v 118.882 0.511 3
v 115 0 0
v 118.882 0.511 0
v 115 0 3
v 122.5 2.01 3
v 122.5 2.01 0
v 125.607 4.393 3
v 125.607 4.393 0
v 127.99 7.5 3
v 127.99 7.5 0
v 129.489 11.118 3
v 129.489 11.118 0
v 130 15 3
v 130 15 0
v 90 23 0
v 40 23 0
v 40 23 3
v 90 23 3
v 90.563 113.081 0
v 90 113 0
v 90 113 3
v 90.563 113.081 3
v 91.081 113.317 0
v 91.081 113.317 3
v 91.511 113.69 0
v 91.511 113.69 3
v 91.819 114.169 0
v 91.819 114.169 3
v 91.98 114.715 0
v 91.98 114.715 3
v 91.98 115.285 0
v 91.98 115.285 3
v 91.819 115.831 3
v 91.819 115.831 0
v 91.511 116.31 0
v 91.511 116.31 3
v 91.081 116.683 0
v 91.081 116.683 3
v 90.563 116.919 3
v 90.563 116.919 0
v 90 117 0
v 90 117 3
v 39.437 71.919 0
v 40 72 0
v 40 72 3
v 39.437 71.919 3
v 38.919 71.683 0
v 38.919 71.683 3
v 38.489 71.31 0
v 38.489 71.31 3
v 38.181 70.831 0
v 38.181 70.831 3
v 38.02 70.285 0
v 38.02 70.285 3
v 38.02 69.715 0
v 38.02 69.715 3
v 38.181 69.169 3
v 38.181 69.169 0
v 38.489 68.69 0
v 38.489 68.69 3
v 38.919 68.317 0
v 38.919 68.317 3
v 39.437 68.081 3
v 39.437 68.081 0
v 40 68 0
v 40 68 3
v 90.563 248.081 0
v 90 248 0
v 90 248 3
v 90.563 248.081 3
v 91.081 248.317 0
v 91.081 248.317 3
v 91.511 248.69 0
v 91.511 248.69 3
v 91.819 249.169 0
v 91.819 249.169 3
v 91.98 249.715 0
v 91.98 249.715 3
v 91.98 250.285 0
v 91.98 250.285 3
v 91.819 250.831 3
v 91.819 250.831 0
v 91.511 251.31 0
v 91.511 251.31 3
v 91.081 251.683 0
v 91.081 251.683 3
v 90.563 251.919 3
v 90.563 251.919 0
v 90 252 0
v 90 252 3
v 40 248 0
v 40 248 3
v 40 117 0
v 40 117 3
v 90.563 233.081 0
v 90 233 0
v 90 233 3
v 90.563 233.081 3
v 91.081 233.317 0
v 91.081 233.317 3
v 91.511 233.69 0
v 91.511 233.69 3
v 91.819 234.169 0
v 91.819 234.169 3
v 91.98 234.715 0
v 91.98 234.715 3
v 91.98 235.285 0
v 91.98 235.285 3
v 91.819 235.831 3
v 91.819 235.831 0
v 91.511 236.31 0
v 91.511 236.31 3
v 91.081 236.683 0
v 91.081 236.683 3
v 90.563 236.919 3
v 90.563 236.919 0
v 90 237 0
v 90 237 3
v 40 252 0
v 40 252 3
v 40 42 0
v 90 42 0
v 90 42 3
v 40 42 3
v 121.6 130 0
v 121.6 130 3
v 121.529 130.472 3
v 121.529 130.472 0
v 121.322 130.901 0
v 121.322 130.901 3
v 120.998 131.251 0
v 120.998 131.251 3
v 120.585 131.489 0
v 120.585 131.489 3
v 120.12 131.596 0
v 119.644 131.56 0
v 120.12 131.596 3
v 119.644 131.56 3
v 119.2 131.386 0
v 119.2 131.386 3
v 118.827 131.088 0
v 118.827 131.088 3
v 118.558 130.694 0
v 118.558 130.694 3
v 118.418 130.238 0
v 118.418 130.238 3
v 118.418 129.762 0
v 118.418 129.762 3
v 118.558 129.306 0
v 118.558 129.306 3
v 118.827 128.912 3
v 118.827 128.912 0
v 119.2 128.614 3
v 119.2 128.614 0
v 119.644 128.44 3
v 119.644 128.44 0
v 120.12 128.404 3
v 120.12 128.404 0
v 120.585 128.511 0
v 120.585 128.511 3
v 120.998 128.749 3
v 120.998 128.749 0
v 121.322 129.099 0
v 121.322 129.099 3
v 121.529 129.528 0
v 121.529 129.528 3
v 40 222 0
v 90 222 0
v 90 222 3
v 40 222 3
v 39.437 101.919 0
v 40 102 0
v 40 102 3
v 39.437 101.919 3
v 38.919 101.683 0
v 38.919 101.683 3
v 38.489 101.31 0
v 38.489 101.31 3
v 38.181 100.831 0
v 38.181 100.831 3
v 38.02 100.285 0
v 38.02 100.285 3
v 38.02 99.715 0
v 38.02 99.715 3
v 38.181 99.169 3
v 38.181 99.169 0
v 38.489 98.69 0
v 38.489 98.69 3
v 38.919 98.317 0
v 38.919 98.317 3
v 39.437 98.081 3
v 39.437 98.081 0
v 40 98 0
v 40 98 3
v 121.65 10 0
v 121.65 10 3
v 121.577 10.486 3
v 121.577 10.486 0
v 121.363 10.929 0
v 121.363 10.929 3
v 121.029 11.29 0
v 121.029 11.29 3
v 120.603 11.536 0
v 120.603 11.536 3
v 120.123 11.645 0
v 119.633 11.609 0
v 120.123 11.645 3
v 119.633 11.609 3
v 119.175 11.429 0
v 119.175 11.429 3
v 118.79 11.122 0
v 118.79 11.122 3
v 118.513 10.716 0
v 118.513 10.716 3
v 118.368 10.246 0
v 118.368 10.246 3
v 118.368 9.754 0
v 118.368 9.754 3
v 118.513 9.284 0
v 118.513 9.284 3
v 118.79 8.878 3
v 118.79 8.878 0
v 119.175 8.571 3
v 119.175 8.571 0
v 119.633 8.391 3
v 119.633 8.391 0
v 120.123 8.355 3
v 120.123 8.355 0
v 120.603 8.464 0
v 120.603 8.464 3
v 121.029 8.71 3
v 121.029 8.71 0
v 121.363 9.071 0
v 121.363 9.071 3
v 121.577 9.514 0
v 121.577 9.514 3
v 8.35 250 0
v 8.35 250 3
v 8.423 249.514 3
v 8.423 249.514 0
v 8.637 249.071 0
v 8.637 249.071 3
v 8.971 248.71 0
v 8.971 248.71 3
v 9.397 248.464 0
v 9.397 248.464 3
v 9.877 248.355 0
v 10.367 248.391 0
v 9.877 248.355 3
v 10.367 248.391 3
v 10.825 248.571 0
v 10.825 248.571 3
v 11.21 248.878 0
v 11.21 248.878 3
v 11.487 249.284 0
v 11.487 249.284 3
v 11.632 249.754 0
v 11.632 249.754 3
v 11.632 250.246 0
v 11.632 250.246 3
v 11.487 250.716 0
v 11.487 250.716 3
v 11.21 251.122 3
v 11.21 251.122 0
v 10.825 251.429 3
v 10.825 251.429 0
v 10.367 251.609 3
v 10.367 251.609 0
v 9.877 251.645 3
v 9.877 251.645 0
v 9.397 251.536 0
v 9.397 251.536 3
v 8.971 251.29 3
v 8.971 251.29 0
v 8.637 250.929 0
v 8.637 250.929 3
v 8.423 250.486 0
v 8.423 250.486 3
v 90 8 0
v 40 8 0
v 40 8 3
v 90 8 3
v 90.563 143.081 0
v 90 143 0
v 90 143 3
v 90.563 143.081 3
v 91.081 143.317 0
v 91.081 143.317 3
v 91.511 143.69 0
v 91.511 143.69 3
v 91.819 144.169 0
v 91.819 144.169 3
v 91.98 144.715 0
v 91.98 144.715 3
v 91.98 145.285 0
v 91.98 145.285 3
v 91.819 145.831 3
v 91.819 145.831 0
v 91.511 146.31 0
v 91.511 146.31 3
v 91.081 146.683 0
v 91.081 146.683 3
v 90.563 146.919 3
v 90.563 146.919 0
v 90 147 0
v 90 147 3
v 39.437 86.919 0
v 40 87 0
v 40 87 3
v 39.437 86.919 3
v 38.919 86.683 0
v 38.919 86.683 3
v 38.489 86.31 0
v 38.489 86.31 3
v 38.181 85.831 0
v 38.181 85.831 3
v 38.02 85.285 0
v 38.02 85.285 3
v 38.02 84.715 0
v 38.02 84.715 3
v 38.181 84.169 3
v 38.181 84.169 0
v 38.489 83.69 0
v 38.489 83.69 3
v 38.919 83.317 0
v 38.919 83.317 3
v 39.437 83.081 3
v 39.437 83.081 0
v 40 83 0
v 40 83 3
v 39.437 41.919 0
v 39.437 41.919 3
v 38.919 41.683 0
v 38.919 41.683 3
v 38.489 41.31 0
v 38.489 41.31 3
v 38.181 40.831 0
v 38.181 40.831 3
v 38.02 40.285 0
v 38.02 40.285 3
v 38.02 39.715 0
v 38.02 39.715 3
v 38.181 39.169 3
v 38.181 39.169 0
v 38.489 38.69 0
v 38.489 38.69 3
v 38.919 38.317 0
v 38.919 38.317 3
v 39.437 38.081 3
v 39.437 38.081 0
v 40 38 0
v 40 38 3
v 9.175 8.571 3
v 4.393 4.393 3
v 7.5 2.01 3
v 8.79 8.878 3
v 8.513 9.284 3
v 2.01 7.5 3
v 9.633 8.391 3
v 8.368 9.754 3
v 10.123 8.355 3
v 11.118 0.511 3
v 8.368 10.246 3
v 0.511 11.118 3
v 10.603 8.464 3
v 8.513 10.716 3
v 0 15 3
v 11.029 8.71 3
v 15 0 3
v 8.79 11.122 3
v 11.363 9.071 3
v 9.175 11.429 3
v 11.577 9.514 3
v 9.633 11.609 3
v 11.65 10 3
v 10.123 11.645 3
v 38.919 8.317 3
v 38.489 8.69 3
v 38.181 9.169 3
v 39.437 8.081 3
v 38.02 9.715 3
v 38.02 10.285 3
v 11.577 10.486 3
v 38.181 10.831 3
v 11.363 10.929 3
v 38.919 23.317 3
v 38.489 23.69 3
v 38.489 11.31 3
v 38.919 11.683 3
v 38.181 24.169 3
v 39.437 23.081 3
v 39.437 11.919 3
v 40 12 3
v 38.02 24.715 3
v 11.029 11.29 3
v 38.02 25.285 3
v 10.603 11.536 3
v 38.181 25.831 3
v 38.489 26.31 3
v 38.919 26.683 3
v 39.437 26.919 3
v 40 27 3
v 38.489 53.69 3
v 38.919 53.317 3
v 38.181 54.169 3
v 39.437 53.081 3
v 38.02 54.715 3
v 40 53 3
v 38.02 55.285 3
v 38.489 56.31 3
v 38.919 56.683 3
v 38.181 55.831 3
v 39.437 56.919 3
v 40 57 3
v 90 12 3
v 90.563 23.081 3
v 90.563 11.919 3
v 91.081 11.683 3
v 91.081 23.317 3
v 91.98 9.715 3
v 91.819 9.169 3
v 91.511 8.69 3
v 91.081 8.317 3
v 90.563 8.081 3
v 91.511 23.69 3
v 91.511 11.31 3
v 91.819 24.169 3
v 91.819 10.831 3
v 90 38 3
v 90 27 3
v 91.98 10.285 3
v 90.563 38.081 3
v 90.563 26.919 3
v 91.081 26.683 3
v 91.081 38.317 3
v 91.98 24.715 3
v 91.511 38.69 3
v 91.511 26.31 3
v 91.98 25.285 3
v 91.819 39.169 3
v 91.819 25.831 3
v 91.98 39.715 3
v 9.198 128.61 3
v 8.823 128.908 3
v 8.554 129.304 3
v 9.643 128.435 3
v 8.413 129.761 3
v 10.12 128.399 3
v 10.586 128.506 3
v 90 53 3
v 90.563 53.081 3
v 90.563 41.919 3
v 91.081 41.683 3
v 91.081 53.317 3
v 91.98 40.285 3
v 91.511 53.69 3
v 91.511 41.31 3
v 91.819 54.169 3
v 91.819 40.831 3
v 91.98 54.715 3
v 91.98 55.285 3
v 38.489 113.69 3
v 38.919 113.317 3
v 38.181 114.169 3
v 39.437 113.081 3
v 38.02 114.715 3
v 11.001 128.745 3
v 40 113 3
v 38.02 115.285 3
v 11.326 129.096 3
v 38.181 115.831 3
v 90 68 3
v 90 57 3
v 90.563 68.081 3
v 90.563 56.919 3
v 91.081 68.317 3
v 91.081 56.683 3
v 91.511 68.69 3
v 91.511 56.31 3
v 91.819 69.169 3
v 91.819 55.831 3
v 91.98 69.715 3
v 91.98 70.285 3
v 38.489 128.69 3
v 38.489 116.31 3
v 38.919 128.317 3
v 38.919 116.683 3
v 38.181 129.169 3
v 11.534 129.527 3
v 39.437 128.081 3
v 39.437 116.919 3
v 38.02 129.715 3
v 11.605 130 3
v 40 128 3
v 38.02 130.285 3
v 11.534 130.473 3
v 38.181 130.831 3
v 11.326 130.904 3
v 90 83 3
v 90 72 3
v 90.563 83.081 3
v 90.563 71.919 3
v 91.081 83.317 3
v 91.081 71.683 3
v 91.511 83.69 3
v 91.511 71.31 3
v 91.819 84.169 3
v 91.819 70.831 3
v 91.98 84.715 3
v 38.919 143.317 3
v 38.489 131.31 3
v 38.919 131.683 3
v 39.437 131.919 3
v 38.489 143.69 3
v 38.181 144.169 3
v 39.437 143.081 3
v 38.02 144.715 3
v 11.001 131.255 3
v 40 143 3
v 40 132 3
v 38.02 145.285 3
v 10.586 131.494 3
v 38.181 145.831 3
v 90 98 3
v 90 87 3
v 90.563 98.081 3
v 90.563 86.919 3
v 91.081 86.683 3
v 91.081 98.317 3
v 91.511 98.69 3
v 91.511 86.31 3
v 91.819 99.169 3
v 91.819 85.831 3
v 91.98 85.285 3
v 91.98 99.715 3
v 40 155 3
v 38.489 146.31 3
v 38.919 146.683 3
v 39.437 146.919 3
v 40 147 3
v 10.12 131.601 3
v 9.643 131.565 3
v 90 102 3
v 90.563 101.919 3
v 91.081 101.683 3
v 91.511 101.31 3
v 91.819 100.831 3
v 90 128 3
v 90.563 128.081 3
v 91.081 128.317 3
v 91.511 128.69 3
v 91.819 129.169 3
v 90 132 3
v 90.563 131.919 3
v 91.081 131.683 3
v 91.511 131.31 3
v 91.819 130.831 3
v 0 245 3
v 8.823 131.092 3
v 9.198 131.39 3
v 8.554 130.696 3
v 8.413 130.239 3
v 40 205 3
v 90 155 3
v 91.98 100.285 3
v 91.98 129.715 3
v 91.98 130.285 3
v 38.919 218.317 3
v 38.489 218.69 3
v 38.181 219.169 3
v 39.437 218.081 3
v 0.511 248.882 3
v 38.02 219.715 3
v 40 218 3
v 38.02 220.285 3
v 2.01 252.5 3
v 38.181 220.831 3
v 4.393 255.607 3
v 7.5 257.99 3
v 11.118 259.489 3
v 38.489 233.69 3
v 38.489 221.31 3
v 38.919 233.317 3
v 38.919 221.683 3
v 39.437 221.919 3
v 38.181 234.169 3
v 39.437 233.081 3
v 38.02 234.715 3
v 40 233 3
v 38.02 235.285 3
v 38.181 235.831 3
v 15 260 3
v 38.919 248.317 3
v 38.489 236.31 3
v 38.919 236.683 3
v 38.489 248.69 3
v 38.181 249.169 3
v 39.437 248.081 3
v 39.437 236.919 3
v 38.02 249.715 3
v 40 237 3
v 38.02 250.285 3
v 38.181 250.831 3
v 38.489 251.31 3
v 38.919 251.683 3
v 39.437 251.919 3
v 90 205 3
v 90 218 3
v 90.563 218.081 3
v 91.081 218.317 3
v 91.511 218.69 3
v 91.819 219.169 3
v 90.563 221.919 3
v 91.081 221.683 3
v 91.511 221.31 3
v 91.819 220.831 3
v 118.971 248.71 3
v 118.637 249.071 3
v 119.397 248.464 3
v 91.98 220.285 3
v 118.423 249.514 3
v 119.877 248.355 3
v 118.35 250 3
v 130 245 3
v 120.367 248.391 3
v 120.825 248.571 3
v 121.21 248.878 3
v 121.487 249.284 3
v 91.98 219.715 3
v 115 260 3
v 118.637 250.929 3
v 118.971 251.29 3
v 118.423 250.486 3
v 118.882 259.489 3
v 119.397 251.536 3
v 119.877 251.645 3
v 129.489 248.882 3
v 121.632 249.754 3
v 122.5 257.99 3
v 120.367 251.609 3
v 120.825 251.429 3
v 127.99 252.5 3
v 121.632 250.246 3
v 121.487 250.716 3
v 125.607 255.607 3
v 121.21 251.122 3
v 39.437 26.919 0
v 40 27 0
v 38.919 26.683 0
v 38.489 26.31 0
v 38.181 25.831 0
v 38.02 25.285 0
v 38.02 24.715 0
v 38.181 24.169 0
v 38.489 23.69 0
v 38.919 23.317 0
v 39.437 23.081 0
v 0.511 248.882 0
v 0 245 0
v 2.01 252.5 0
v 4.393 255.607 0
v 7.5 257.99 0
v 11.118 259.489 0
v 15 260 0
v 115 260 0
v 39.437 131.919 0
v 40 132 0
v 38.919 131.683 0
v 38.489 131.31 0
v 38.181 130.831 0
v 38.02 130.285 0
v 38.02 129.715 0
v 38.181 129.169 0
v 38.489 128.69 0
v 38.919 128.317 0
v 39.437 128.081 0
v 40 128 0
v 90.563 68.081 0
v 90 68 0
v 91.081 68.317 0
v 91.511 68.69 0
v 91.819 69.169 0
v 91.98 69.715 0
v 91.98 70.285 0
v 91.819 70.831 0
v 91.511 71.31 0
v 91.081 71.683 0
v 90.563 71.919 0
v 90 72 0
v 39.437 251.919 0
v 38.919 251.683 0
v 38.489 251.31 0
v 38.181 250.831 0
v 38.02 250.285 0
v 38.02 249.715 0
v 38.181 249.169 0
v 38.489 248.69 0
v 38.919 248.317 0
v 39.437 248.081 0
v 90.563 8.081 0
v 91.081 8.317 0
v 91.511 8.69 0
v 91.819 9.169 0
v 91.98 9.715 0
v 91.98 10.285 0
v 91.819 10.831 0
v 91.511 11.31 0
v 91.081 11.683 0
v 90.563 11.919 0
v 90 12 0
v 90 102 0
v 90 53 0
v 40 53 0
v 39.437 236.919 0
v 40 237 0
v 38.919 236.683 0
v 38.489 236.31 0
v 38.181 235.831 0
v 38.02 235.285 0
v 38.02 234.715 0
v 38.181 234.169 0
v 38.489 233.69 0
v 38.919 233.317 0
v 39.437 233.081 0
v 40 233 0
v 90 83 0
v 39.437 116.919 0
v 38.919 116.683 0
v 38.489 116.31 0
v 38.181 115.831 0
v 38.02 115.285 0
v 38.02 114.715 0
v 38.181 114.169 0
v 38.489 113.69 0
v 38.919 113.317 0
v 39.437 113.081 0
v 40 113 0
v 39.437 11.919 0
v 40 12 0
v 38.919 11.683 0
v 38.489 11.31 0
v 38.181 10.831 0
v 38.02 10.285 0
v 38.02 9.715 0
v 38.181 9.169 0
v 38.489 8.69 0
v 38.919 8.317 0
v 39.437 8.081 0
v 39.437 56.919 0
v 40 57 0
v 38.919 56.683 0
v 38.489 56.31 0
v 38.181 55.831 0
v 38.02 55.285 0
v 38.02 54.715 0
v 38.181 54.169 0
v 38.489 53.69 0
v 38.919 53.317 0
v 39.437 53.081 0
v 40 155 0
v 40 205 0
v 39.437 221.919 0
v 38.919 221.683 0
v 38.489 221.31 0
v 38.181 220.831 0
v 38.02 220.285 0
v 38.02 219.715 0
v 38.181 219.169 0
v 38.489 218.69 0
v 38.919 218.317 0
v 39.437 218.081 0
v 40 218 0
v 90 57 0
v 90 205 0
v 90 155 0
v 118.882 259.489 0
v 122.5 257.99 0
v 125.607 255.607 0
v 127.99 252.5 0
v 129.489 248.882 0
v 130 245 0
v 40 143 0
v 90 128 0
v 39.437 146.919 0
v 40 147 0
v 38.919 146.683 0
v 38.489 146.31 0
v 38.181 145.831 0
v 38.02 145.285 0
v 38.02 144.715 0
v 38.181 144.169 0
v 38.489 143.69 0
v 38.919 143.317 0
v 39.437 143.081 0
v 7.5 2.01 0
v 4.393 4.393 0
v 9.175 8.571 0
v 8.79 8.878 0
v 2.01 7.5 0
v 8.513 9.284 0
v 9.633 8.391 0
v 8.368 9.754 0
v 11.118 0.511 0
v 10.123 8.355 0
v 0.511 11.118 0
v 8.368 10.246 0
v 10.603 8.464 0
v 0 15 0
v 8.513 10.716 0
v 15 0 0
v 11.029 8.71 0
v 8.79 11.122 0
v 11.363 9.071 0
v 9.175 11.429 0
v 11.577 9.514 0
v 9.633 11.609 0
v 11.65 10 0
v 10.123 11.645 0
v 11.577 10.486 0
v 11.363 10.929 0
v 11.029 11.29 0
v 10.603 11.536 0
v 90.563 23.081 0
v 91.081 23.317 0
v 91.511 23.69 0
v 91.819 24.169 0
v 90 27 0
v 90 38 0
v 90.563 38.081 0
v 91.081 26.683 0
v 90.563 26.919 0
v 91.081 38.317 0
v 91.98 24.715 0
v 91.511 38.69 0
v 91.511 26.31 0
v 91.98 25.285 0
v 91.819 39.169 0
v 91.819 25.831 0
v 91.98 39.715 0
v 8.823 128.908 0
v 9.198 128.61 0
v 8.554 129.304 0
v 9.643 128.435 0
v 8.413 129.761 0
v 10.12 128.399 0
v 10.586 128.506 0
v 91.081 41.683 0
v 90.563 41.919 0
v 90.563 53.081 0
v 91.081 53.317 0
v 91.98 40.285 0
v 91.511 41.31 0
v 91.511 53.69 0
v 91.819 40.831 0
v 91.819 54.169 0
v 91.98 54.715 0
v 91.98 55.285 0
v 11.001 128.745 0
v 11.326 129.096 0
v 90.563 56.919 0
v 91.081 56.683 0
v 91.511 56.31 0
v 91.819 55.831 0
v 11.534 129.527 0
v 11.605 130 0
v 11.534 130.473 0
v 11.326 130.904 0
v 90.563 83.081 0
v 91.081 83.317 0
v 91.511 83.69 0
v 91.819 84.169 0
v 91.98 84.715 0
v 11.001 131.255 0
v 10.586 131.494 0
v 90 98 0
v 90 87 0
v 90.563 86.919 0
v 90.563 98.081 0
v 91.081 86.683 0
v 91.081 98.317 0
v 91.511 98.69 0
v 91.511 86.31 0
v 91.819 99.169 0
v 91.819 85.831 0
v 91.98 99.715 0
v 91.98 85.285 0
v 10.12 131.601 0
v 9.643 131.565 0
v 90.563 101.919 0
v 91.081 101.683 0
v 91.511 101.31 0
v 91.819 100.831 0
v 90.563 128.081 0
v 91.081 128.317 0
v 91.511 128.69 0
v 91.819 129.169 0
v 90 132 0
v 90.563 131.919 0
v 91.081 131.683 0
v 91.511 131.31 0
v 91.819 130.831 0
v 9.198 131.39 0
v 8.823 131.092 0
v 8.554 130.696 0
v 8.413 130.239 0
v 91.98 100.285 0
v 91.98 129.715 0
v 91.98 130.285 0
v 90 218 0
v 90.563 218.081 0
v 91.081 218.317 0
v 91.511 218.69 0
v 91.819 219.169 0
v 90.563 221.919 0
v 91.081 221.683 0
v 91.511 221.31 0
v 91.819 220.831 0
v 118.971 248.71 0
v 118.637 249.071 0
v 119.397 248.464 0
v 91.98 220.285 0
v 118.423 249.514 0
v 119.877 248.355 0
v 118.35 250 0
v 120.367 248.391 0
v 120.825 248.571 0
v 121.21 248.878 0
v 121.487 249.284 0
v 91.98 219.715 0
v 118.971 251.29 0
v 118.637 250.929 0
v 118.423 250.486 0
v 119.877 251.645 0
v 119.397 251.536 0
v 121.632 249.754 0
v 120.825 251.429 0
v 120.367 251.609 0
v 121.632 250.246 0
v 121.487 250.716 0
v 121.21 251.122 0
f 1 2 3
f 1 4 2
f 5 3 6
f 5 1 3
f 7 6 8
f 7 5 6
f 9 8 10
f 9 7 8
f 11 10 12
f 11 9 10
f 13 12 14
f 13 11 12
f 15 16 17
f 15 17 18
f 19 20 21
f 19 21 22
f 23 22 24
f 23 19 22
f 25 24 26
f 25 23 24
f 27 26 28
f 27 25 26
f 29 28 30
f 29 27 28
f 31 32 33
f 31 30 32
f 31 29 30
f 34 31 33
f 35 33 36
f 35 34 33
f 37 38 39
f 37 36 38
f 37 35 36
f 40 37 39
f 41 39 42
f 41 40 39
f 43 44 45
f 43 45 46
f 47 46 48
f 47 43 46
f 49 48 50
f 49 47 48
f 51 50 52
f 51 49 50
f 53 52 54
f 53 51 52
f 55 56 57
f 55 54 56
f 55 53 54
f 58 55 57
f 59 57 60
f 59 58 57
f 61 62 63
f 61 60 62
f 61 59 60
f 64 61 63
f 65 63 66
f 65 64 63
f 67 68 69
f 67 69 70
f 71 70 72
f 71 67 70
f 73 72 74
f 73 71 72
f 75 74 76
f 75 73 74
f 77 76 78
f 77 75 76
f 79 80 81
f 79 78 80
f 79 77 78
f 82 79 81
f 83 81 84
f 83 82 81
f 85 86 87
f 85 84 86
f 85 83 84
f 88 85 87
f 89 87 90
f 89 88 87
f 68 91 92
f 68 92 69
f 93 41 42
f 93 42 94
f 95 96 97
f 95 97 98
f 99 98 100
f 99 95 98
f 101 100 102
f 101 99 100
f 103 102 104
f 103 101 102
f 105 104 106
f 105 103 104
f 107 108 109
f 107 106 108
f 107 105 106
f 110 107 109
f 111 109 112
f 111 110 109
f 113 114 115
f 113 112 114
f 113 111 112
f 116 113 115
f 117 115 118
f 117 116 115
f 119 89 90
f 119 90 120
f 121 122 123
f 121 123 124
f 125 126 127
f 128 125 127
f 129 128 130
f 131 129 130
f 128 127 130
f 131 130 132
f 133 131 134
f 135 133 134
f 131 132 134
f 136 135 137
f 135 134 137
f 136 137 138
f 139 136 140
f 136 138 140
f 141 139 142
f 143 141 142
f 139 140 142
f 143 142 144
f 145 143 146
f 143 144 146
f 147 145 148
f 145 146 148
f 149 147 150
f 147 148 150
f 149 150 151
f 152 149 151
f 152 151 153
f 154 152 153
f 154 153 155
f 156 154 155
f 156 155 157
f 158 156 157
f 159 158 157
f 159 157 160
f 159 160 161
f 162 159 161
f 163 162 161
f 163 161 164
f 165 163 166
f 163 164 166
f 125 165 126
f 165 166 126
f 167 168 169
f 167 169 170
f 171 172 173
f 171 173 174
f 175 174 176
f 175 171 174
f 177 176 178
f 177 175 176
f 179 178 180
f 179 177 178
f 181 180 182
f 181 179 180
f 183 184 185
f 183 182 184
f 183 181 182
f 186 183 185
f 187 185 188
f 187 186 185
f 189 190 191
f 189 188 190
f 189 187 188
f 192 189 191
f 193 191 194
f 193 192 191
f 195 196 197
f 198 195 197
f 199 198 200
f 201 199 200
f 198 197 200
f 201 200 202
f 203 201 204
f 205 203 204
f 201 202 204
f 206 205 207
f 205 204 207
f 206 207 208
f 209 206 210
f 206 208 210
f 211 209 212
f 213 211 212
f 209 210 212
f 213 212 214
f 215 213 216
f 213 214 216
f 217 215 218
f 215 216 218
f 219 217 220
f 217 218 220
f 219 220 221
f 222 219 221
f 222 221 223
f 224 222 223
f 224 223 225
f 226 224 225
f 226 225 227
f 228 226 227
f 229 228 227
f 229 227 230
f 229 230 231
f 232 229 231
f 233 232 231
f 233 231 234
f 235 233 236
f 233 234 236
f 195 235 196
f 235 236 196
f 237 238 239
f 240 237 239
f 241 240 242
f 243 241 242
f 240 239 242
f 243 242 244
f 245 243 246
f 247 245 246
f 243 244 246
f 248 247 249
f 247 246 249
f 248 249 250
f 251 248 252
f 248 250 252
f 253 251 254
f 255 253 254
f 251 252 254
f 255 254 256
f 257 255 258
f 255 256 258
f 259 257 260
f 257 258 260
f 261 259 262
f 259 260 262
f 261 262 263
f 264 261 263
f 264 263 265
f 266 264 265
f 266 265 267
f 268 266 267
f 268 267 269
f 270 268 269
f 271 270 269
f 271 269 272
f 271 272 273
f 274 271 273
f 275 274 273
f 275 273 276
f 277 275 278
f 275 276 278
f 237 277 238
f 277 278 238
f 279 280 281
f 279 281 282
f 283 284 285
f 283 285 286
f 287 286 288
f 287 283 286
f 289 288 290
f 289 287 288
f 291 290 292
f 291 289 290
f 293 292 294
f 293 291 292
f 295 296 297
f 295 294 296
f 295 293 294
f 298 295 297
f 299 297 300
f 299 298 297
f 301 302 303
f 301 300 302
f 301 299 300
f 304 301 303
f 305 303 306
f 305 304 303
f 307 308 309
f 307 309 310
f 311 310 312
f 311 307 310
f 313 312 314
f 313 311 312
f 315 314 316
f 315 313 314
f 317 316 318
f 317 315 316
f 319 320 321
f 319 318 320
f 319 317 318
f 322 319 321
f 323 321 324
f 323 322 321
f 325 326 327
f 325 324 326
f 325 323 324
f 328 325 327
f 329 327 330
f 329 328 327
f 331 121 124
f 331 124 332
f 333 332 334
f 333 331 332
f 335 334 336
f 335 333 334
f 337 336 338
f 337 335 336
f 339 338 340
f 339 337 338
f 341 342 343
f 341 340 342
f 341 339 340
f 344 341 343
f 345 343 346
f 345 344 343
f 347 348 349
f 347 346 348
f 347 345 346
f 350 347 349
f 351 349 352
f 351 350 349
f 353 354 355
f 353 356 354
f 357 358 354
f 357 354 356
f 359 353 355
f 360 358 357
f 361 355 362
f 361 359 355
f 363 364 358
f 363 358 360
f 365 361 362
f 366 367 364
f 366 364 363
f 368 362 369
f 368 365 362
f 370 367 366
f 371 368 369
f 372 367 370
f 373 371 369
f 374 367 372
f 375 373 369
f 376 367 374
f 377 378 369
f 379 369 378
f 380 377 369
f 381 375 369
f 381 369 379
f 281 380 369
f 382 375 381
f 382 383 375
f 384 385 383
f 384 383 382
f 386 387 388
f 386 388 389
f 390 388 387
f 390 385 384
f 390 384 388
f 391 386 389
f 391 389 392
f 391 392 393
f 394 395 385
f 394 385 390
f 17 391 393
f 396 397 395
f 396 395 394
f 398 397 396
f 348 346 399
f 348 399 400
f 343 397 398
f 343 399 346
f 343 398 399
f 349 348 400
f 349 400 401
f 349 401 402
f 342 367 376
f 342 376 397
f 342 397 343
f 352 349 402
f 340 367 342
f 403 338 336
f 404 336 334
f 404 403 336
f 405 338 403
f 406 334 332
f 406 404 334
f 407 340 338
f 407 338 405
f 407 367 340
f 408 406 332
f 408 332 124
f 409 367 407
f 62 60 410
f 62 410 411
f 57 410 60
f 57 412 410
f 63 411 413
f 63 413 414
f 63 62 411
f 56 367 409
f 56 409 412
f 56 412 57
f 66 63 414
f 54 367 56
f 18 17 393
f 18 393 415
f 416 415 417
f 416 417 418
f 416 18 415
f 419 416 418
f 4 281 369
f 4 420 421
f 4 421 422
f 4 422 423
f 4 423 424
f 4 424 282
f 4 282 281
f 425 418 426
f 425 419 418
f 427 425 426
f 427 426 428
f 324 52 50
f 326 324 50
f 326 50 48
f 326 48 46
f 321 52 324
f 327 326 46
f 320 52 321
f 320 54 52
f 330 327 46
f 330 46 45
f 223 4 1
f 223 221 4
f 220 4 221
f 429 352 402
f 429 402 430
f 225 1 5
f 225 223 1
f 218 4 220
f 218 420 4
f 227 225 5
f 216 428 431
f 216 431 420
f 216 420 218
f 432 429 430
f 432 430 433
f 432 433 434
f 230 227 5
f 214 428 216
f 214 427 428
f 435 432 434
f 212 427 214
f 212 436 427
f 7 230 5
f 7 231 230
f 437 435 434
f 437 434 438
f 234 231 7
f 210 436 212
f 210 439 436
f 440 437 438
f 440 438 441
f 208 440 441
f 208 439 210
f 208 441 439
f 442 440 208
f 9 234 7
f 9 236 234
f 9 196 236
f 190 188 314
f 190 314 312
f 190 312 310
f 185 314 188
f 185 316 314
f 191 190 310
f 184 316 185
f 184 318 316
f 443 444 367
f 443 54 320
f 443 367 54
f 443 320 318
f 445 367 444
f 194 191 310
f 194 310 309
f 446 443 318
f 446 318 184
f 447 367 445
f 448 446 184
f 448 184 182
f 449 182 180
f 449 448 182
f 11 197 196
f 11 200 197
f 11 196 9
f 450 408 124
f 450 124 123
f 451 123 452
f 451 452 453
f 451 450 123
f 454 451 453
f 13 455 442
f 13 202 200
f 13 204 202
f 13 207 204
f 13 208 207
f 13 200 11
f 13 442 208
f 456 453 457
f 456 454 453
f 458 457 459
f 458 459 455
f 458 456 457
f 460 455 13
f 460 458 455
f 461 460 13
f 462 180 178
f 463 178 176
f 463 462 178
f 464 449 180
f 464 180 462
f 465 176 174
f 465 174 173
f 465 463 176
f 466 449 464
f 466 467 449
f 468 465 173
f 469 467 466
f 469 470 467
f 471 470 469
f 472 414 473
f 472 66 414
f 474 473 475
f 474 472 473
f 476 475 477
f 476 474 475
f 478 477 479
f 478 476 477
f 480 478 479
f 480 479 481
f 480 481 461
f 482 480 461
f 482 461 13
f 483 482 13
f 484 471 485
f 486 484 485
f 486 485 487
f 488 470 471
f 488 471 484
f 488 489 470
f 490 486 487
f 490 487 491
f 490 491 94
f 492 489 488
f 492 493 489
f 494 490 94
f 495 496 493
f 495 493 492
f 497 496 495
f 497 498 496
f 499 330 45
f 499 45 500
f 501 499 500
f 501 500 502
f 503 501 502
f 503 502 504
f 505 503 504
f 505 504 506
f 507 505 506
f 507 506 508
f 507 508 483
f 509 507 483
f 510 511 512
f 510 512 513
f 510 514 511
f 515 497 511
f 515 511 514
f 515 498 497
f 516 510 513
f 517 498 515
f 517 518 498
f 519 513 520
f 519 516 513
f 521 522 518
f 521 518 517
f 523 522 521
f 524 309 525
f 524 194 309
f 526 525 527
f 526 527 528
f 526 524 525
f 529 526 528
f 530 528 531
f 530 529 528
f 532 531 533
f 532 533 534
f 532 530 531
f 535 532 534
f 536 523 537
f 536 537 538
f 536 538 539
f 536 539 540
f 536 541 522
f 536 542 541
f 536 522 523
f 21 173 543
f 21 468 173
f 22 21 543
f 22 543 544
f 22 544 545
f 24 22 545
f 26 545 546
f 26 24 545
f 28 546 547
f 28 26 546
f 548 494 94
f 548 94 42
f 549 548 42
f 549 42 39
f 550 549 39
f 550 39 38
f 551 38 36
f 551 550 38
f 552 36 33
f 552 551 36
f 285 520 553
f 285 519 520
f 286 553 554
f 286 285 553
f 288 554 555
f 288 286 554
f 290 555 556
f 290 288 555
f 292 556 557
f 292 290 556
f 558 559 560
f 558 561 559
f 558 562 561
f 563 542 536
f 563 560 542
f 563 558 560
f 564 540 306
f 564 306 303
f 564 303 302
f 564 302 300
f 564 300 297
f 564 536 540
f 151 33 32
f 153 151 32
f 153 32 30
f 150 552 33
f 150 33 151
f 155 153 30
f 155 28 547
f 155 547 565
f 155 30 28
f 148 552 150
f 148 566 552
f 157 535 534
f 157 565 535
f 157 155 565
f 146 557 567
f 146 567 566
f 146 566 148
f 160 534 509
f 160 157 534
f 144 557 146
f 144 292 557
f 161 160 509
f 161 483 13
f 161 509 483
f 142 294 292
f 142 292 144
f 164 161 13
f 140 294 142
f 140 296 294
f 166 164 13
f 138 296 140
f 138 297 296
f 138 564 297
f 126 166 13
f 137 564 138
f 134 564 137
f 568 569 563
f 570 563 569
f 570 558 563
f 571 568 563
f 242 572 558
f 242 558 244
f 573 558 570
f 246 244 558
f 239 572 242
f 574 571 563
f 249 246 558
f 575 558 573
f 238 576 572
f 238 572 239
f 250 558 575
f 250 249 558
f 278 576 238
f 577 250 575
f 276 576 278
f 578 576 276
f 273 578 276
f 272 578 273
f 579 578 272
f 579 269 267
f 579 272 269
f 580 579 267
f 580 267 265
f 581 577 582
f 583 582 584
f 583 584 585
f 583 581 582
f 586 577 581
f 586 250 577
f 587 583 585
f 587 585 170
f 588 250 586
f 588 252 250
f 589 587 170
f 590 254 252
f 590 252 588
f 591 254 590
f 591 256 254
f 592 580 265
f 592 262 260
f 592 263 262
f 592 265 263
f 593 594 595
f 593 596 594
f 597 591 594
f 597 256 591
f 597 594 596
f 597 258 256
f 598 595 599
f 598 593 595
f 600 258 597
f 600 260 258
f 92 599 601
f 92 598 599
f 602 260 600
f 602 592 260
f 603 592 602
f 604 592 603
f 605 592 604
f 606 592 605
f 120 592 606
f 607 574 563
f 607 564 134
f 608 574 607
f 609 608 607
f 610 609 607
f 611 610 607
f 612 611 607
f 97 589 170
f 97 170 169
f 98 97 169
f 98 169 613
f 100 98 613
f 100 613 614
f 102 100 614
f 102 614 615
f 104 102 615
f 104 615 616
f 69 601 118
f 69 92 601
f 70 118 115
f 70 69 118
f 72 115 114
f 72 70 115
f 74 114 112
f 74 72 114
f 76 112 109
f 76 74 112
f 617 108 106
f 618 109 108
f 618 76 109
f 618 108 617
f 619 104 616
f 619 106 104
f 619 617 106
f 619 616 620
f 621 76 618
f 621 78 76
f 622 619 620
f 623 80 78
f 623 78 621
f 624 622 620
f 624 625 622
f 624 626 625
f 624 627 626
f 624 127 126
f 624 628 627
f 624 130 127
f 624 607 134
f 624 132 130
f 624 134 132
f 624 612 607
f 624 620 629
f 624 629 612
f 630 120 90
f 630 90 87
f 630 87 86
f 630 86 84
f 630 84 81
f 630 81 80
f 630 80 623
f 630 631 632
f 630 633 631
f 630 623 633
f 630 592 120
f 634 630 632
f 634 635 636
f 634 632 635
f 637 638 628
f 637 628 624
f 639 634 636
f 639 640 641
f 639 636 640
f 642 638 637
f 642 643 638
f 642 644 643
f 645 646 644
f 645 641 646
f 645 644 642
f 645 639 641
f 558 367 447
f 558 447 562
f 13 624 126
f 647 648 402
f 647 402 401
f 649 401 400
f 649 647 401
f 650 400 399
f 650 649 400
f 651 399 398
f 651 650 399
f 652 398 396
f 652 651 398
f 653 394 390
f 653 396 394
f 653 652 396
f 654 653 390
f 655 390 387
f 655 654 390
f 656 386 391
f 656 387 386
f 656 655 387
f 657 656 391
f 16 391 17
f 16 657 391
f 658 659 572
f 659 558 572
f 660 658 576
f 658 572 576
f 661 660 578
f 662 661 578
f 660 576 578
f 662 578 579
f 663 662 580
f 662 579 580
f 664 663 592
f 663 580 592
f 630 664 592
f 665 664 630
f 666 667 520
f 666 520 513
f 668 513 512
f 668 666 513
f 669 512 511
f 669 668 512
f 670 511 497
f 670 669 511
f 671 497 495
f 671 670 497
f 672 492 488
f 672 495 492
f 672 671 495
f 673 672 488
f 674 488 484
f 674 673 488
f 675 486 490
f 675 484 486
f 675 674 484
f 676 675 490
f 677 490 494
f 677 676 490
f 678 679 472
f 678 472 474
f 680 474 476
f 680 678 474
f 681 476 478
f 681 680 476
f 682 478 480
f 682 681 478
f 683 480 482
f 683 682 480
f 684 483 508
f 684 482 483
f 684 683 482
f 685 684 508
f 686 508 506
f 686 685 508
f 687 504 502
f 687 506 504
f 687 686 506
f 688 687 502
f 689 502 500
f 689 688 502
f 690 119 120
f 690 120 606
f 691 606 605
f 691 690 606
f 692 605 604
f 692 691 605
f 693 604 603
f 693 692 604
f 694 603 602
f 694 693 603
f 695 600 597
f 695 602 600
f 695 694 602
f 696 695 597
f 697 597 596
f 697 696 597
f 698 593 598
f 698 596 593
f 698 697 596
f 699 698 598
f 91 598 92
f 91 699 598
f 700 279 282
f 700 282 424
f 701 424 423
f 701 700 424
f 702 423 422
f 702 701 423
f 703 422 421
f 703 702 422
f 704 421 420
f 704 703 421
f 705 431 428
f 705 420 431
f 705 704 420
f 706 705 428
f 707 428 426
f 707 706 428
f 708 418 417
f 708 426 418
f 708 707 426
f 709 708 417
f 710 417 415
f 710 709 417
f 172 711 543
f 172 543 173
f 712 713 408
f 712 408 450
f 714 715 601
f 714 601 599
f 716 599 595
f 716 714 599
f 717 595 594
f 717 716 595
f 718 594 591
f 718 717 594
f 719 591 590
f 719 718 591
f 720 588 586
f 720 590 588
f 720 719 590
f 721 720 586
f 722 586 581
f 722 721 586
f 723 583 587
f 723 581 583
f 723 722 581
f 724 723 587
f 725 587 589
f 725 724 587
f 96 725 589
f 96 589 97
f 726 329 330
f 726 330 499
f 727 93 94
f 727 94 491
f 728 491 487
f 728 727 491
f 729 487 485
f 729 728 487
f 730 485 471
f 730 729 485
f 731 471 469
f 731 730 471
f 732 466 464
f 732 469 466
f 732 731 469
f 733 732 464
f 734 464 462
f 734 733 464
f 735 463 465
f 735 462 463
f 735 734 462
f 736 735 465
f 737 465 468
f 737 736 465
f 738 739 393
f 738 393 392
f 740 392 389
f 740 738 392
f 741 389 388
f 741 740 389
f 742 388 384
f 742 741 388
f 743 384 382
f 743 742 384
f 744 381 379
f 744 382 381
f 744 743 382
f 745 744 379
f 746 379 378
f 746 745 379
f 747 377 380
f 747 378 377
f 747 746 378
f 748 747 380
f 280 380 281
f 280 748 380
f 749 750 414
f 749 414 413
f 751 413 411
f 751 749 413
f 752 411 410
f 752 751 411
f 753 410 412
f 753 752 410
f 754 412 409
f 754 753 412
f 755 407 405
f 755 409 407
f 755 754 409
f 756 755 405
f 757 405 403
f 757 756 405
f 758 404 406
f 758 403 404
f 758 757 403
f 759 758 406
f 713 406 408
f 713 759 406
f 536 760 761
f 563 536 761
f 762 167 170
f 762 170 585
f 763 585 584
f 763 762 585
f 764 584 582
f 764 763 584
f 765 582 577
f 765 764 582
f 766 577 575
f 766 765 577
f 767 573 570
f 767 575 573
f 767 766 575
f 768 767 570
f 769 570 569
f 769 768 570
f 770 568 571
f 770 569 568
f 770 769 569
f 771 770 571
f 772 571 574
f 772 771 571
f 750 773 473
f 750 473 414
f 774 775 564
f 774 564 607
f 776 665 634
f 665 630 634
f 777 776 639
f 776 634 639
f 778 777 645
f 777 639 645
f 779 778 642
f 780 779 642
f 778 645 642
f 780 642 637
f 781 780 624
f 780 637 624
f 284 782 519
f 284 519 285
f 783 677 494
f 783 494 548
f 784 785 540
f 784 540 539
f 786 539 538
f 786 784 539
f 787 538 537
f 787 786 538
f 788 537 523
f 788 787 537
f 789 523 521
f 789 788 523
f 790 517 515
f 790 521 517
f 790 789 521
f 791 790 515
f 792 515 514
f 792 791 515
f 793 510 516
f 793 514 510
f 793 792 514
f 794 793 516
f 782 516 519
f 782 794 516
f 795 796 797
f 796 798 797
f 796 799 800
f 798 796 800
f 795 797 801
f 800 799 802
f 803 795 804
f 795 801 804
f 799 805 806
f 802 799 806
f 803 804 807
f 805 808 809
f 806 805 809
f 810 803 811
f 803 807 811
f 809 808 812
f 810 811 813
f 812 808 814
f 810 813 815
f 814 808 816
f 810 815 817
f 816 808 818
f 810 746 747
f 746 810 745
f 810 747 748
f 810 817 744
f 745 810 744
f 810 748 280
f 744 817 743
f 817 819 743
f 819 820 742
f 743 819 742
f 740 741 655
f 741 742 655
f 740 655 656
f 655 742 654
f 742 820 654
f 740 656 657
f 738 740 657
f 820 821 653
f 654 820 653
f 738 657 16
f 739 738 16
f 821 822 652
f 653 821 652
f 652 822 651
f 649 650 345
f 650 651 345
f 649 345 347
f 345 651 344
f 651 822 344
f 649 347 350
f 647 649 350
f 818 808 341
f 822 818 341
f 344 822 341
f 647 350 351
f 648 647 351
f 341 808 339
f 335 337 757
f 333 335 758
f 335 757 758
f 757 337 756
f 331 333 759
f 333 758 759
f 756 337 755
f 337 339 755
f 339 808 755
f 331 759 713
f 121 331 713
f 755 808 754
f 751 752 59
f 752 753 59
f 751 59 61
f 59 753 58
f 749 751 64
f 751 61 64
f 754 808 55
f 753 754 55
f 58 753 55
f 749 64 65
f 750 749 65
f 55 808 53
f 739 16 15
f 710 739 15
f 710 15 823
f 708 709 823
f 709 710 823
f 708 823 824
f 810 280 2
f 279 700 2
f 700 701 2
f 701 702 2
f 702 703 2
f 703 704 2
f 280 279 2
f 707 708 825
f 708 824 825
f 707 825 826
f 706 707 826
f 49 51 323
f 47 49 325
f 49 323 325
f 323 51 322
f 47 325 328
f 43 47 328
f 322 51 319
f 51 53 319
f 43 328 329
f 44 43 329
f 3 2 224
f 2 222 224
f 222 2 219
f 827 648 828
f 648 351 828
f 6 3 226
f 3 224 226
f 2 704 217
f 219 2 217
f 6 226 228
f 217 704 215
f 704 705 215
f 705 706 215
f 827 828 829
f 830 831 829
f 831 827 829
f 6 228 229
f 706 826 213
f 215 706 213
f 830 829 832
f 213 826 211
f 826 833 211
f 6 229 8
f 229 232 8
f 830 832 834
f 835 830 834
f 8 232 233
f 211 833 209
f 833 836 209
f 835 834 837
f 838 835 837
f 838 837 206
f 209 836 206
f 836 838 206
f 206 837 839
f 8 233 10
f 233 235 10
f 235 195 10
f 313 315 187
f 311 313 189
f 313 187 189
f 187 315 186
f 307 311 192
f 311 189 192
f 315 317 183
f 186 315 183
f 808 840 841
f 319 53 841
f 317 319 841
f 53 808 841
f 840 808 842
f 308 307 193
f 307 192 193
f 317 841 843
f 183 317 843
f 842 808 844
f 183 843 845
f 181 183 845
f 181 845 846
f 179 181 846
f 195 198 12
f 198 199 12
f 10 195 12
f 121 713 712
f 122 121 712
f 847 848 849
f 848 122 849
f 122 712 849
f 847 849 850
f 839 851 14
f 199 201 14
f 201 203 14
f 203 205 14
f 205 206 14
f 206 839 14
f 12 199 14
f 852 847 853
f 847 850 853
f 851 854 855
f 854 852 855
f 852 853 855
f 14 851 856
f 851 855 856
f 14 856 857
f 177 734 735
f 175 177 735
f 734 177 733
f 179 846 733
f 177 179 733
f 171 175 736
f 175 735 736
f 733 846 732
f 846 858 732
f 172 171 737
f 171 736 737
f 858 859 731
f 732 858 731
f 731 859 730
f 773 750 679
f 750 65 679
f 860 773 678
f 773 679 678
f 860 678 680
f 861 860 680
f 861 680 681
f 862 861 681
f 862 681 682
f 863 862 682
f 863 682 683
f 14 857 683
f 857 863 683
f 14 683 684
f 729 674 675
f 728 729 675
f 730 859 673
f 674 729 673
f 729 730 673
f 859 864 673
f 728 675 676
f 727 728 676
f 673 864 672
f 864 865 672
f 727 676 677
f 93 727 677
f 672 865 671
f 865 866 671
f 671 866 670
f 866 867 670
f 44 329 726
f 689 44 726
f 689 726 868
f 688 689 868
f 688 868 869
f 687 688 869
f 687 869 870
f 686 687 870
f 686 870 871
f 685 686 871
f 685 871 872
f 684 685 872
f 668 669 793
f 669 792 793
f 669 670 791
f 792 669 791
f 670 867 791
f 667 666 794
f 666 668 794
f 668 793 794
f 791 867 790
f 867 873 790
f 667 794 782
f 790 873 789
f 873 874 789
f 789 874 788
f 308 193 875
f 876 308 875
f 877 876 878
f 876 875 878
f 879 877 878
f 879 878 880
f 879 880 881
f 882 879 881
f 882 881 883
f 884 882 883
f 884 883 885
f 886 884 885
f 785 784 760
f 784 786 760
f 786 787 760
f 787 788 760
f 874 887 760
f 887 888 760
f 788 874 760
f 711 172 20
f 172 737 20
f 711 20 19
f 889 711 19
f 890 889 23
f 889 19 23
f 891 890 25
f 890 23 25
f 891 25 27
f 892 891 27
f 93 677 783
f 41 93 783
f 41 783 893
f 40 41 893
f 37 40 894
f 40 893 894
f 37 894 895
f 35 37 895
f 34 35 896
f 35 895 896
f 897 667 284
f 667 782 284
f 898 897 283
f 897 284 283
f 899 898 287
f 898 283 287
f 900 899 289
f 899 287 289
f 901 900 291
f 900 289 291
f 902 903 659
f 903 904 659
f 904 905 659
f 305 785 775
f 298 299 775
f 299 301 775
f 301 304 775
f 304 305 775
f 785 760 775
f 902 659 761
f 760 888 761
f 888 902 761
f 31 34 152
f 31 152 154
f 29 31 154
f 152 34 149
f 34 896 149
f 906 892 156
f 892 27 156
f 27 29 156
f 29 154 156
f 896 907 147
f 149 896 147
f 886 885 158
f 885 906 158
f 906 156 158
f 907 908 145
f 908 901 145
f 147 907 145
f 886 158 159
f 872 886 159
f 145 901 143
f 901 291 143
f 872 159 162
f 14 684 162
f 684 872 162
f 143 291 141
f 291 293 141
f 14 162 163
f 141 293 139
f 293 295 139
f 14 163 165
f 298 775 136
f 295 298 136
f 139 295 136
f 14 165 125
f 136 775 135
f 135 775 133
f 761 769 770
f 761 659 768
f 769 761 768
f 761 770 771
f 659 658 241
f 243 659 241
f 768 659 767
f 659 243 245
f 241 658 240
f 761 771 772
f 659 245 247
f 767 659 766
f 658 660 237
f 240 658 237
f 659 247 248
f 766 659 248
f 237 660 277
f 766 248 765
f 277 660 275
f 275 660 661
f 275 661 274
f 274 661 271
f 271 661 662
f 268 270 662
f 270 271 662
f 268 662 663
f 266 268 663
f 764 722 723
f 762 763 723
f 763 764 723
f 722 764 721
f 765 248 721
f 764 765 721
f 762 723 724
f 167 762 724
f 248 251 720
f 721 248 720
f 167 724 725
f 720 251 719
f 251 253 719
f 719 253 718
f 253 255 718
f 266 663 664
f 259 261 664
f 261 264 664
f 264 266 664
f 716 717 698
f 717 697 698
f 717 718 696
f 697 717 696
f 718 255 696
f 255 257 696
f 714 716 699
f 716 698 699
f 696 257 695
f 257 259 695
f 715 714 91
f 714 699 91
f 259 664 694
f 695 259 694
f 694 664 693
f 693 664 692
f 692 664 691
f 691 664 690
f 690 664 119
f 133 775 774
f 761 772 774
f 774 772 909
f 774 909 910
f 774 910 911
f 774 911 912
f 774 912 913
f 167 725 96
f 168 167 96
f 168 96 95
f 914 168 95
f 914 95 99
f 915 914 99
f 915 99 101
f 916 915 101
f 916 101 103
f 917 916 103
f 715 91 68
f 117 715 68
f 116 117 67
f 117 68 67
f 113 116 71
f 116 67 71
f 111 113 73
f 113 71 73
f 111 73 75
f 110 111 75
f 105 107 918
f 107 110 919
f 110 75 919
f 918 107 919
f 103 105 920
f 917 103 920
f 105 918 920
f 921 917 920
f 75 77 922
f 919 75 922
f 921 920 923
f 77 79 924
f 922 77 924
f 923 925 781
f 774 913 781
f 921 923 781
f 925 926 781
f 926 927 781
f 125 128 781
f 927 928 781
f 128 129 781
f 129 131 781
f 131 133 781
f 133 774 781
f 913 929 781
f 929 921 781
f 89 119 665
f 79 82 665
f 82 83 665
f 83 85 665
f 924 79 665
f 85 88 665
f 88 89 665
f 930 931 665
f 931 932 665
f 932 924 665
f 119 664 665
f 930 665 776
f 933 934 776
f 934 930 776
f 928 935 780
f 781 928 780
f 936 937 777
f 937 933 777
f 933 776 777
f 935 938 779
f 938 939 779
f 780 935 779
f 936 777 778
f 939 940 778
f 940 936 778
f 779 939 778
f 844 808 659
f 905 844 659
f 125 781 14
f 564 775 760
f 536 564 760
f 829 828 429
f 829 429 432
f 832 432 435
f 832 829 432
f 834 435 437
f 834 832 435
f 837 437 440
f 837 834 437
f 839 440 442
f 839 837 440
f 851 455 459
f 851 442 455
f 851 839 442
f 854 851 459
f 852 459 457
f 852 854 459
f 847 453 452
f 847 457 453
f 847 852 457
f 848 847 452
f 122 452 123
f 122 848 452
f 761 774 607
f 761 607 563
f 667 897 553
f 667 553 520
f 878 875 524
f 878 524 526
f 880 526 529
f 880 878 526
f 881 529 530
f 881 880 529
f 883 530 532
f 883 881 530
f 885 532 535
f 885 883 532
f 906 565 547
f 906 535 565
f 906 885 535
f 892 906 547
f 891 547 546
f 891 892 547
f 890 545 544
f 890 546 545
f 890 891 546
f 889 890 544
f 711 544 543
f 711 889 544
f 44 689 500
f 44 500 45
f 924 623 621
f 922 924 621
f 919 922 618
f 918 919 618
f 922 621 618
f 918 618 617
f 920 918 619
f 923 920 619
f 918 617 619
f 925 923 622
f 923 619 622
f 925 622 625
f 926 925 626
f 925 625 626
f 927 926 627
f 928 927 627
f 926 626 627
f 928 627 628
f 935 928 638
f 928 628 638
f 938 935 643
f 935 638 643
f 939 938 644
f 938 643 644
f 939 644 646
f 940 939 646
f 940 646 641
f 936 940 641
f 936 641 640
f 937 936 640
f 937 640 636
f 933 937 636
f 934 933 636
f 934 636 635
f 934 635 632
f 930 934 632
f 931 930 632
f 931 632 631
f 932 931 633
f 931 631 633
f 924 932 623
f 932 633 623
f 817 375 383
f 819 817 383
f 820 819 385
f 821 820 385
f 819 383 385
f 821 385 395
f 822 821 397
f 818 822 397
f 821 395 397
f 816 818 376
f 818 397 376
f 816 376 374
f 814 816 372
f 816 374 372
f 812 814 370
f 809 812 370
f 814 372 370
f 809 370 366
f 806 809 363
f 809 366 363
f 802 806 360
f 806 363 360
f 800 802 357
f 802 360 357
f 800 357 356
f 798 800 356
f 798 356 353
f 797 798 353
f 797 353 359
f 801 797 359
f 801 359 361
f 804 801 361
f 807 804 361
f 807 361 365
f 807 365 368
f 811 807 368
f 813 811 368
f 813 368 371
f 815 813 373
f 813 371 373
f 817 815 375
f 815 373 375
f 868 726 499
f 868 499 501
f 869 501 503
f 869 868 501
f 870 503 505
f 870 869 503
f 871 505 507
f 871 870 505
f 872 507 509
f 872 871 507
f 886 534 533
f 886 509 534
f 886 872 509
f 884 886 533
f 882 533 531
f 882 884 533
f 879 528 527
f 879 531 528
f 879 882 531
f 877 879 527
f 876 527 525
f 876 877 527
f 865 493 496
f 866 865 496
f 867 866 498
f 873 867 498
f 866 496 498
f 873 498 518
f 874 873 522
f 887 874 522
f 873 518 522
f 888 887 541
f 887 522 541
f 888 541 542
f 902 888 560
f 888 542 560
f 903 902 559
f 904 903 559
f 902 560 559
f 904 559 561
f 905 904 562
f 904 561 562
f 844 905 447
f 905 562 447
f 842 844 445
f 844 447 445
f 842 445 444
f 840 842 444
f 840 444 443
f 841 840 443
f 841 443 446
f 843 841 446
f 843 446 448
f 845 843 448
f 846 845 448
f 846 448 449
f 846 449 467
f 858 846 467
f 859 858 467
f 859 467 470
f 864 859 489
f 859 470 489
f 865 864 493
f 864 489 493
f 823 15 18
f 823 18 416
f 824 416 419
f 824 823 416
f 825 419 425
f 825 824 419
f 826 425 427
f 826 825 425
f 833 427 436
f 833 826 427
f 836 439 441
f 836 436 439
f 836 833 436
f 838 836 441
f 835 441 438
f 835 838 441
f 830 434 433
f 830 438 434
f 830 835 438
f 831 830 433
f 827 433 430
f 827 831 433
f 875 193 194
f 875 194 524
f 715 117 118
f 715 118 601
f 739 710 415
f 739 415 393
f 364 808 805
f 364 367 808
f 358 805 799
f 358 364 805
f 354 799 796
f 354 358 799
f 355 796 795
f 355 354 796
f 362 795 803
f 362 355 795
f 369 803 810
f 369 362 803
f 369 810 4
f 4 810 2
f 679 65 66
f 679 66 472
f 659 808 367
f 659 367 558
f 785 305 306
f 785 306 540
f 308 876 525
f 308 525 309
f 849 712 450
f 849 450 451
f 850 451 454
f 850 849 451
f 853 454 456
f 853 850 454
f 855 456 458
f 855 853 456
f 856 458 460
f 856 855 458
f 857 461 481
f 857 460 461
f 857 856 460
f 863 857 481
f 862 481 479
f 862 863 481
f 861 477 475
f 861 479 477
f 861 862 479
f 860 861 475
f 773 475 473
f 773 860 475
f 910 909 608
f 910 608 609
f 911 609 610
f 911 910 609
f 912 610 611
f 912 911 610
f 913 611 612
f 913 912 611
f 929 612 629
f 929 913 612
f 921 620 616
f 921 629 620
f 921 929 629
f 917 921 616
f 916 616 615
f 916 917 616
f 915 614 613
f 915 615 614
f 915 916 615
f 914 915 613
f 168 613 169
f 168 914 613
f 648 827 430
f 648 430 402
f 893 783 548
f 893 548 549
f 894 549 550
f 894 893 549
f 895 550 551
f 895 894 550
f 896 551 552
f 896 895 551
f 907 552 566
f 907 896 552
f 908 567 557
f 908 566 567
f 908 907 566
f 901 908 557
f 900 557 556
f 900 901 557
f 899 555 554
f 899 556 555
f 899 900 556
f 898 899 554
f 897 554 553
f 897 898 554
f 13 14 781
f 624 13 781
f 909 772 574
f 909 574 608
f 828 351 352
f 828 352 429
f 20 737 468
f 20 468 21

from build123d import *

# Parameters (mm, degrees)
SKETCH_1_W          = 130
SKETCH_1_H          = 260
EXTRUDE_1_DEPTH     = 3
SKETCH_2_R          = 1.65
SKETCH_2_R_2        = 1.6
SKETCH_2_R_3        = 1.605
CUT_EXTRUDE_1_DEPTH = 3
SKETCH_3_W          = 50
SKETCH_3_H          = 50
CUT_EXTRUDE_2_DEPTH = 10
FILLET_1_R          = 15
CUT_EXTRUDE_4_DEPTH = 10


with BuildPart() as part:
    # 草图1 → 凸台-拉伸1 (new body)
    with BuildSketch(Plane.XY):
        with Locations((65, 130)):
            Rectangle(SKETCH_1_W, SKETCH_1_H)
    extrude(amount=EXTRUDE_1_DEPTH)

    # 草图2 → 切除-拉伸1 (cut)
    with BuildSketch(Plane.XY.offset(3)):
        with Locations((120, 10)):
            Circle(SKETCH_2_R)
        with Locations((10, 10)):
            Circle(SKETCH_2_R)
        with Locations(Location((10, 250, 0), (0, 0, 180))):
            Circle(SKETCH_2_R)
        with Locations(Location((120, 250, 0), (0, 0, 180))):
            Circle(SKETCH_2_R)
        with Locations((120, 130)):
            Circle(SKETCH_2_R_2)
        with Locations((10, 130)):
            Circle(SKETCH_2_R_3)
    extrude(amount=-CUT_EXTRUDE_1_DEPTH, mode=Mode.SUBTRACT)

    # 草图3 → 切除-拉伸2 (cut)
    with BuildSketch(Plane(origin=(0, 0, 0), x_dir=(-1, 0, 0), z_dir=(0, 0, -1))):
        with Locations((-65, 180)):
            Rectangle(SKETCH_3_W, SKETCH_3_H)
    extrude(amount=-CUT_EXTRUDE_2_DEPTH, mode=Mode.SUBTRACT)

    # 圆角1
    fillet_1_edges = [part.edges().sort_by_distance(p)[0] for p in [
        (0, 0, 1.5),
        (130, 0, 1.5),
        (130, 260, 1.5),
        (0, 260, 1.5),
    ]]
    fillet(fillet_1_edges, radius=FILLET_1_R)

    # 草图4 → 切除-拉伸4 (cut)
    with BuildSketch(Plane(origin=(0, 0, 0), x_dir=(-1, 0, 0), z_dir=(0, 0, -1))):
        with BuildLine():
            Line((-90, 12), (-40, 12))
            ThreePointArc((-40, 12), (-38, 10), (-40, 8))
            Line((-40, 8), (-90, 8))
            ThreePointArc((-90, 8), (-92, 10), (-90, 12))
        make_face()
        with BuildLine():
            Line((-90, 27), (-40, 27))
            ThreePointArc((-40, 27), (-38, 25), (-40, 23))
            Line((-40, 23), (-90, 23))
            ThreePointArc((-90, 23), (-92, 25), (-90, 27))
        make_face()
        with BuildLine():
            Line((-90, 42), (-40, 42))
            ThreePointArc((-40, 42), (-38, 40), (-40, 38))
            Line((-40, 38), (-90, 38))
            ThreePointArc((-90, 38), (-92, 40), (-90, 42))
        make_face()
        with BuildLine():
            Line((-90, 57), (-40, 57))
            ThreePointArc((-40, 57), (-38, 55), (-40, 53))
            Line((-40, 53), (-90, 53))
            ThreePointArc((-90, 53), (-92, 55), (-90, 57))
        make_face()
        with BuildLine():
            Line((-90, 72), (-40, 72))
            ThreePointArc((-40, 72), (-38, 70), (-40, 68))
            Line((-40, 68), (-90, 68))
            ThreePointArc((-90, 68), (-92, 70), (-90, 72))
        make_face()
        with BuildLine():
            Line((-90, 87), (-40, 87))
            ThreePointArc((-40, 87), (-38, 85), (-40, 83))
            Line((-40, 83), (-90, 83))
            ThreePointArc((-90, 83), (-92, 85), (-90, 87))
        make_face()
        with BuildLine():
            Line((-90, 102), (-40, 102))
            ThreePointArc((-40, 102), (-38, 100), (-40, 98))
            Line((-40, 98), (-90, 98))
            ThreePointArc((-90, 98), (-92, 100), (-90, 102))
        make_face()
        with BuildLine():
            Line((-90, 117), (-40, 117))
            ThreePointArc((-40, 117), (-38, 115), (-40, 113))
            Line((-40, 113), (-90, 113))
            ThreePointArc((-90, 113), (-92, 115), (-90, 117))
        make_face()
        with BuildLine():
            Line((-90, 132), (-40, 132))
            ThreePointArc((-40, 132), (-38, 130), (-40, 128))
            Line((-40, 128), (-90, 128))
            ThreePointArc((-90, 128), (-92, 130), (-90, 132))
        make_face()
        with BuildLine():
            Line((-90, 147), (-40, 147))
            ThreePointArc((-40, 147), (-38, 145), (-40, 143))
            Line((-40, 143), (-90, 143))
            ThreePointArc((-90, 143), (-92, 145), (-90, 147))
        make_face()
        with BuildLine():
            Line((-90, 222), (-40, 222))
            ThreePointArc((-40, 222), (-38, 220), (-40, 218))
            Line((-40, 218), (-90, 218))
            ThreePointArc((-90, 218), (-92, 220), (-90, 222))
        make_face()
        with BuildLine():
            Line((-90, 237), (-40, 237))
            ThreePointArc((-40, 237), (-38, 235), (-40, 233))
            Line((-40, 233), (-90, 233))
            ThreePointArc((-90, 233), (-92, 235), (-90, 237))
        make_face()
        with BuildLine():
            Line((-90, 252), (-40, 252))
            ThreePointArc((-40, 252), (-38, 250), (-40, 248))
            Line((-40, 248), (-90, 248))
            ThreePointArc((-90, 248), (-92, 250), (-90, 252))
        make_face()
    extrude(amount=-CUT_EXTRUDE_4_DEPTH, mode=Mode.SUBTRACT)


solid = part.part
